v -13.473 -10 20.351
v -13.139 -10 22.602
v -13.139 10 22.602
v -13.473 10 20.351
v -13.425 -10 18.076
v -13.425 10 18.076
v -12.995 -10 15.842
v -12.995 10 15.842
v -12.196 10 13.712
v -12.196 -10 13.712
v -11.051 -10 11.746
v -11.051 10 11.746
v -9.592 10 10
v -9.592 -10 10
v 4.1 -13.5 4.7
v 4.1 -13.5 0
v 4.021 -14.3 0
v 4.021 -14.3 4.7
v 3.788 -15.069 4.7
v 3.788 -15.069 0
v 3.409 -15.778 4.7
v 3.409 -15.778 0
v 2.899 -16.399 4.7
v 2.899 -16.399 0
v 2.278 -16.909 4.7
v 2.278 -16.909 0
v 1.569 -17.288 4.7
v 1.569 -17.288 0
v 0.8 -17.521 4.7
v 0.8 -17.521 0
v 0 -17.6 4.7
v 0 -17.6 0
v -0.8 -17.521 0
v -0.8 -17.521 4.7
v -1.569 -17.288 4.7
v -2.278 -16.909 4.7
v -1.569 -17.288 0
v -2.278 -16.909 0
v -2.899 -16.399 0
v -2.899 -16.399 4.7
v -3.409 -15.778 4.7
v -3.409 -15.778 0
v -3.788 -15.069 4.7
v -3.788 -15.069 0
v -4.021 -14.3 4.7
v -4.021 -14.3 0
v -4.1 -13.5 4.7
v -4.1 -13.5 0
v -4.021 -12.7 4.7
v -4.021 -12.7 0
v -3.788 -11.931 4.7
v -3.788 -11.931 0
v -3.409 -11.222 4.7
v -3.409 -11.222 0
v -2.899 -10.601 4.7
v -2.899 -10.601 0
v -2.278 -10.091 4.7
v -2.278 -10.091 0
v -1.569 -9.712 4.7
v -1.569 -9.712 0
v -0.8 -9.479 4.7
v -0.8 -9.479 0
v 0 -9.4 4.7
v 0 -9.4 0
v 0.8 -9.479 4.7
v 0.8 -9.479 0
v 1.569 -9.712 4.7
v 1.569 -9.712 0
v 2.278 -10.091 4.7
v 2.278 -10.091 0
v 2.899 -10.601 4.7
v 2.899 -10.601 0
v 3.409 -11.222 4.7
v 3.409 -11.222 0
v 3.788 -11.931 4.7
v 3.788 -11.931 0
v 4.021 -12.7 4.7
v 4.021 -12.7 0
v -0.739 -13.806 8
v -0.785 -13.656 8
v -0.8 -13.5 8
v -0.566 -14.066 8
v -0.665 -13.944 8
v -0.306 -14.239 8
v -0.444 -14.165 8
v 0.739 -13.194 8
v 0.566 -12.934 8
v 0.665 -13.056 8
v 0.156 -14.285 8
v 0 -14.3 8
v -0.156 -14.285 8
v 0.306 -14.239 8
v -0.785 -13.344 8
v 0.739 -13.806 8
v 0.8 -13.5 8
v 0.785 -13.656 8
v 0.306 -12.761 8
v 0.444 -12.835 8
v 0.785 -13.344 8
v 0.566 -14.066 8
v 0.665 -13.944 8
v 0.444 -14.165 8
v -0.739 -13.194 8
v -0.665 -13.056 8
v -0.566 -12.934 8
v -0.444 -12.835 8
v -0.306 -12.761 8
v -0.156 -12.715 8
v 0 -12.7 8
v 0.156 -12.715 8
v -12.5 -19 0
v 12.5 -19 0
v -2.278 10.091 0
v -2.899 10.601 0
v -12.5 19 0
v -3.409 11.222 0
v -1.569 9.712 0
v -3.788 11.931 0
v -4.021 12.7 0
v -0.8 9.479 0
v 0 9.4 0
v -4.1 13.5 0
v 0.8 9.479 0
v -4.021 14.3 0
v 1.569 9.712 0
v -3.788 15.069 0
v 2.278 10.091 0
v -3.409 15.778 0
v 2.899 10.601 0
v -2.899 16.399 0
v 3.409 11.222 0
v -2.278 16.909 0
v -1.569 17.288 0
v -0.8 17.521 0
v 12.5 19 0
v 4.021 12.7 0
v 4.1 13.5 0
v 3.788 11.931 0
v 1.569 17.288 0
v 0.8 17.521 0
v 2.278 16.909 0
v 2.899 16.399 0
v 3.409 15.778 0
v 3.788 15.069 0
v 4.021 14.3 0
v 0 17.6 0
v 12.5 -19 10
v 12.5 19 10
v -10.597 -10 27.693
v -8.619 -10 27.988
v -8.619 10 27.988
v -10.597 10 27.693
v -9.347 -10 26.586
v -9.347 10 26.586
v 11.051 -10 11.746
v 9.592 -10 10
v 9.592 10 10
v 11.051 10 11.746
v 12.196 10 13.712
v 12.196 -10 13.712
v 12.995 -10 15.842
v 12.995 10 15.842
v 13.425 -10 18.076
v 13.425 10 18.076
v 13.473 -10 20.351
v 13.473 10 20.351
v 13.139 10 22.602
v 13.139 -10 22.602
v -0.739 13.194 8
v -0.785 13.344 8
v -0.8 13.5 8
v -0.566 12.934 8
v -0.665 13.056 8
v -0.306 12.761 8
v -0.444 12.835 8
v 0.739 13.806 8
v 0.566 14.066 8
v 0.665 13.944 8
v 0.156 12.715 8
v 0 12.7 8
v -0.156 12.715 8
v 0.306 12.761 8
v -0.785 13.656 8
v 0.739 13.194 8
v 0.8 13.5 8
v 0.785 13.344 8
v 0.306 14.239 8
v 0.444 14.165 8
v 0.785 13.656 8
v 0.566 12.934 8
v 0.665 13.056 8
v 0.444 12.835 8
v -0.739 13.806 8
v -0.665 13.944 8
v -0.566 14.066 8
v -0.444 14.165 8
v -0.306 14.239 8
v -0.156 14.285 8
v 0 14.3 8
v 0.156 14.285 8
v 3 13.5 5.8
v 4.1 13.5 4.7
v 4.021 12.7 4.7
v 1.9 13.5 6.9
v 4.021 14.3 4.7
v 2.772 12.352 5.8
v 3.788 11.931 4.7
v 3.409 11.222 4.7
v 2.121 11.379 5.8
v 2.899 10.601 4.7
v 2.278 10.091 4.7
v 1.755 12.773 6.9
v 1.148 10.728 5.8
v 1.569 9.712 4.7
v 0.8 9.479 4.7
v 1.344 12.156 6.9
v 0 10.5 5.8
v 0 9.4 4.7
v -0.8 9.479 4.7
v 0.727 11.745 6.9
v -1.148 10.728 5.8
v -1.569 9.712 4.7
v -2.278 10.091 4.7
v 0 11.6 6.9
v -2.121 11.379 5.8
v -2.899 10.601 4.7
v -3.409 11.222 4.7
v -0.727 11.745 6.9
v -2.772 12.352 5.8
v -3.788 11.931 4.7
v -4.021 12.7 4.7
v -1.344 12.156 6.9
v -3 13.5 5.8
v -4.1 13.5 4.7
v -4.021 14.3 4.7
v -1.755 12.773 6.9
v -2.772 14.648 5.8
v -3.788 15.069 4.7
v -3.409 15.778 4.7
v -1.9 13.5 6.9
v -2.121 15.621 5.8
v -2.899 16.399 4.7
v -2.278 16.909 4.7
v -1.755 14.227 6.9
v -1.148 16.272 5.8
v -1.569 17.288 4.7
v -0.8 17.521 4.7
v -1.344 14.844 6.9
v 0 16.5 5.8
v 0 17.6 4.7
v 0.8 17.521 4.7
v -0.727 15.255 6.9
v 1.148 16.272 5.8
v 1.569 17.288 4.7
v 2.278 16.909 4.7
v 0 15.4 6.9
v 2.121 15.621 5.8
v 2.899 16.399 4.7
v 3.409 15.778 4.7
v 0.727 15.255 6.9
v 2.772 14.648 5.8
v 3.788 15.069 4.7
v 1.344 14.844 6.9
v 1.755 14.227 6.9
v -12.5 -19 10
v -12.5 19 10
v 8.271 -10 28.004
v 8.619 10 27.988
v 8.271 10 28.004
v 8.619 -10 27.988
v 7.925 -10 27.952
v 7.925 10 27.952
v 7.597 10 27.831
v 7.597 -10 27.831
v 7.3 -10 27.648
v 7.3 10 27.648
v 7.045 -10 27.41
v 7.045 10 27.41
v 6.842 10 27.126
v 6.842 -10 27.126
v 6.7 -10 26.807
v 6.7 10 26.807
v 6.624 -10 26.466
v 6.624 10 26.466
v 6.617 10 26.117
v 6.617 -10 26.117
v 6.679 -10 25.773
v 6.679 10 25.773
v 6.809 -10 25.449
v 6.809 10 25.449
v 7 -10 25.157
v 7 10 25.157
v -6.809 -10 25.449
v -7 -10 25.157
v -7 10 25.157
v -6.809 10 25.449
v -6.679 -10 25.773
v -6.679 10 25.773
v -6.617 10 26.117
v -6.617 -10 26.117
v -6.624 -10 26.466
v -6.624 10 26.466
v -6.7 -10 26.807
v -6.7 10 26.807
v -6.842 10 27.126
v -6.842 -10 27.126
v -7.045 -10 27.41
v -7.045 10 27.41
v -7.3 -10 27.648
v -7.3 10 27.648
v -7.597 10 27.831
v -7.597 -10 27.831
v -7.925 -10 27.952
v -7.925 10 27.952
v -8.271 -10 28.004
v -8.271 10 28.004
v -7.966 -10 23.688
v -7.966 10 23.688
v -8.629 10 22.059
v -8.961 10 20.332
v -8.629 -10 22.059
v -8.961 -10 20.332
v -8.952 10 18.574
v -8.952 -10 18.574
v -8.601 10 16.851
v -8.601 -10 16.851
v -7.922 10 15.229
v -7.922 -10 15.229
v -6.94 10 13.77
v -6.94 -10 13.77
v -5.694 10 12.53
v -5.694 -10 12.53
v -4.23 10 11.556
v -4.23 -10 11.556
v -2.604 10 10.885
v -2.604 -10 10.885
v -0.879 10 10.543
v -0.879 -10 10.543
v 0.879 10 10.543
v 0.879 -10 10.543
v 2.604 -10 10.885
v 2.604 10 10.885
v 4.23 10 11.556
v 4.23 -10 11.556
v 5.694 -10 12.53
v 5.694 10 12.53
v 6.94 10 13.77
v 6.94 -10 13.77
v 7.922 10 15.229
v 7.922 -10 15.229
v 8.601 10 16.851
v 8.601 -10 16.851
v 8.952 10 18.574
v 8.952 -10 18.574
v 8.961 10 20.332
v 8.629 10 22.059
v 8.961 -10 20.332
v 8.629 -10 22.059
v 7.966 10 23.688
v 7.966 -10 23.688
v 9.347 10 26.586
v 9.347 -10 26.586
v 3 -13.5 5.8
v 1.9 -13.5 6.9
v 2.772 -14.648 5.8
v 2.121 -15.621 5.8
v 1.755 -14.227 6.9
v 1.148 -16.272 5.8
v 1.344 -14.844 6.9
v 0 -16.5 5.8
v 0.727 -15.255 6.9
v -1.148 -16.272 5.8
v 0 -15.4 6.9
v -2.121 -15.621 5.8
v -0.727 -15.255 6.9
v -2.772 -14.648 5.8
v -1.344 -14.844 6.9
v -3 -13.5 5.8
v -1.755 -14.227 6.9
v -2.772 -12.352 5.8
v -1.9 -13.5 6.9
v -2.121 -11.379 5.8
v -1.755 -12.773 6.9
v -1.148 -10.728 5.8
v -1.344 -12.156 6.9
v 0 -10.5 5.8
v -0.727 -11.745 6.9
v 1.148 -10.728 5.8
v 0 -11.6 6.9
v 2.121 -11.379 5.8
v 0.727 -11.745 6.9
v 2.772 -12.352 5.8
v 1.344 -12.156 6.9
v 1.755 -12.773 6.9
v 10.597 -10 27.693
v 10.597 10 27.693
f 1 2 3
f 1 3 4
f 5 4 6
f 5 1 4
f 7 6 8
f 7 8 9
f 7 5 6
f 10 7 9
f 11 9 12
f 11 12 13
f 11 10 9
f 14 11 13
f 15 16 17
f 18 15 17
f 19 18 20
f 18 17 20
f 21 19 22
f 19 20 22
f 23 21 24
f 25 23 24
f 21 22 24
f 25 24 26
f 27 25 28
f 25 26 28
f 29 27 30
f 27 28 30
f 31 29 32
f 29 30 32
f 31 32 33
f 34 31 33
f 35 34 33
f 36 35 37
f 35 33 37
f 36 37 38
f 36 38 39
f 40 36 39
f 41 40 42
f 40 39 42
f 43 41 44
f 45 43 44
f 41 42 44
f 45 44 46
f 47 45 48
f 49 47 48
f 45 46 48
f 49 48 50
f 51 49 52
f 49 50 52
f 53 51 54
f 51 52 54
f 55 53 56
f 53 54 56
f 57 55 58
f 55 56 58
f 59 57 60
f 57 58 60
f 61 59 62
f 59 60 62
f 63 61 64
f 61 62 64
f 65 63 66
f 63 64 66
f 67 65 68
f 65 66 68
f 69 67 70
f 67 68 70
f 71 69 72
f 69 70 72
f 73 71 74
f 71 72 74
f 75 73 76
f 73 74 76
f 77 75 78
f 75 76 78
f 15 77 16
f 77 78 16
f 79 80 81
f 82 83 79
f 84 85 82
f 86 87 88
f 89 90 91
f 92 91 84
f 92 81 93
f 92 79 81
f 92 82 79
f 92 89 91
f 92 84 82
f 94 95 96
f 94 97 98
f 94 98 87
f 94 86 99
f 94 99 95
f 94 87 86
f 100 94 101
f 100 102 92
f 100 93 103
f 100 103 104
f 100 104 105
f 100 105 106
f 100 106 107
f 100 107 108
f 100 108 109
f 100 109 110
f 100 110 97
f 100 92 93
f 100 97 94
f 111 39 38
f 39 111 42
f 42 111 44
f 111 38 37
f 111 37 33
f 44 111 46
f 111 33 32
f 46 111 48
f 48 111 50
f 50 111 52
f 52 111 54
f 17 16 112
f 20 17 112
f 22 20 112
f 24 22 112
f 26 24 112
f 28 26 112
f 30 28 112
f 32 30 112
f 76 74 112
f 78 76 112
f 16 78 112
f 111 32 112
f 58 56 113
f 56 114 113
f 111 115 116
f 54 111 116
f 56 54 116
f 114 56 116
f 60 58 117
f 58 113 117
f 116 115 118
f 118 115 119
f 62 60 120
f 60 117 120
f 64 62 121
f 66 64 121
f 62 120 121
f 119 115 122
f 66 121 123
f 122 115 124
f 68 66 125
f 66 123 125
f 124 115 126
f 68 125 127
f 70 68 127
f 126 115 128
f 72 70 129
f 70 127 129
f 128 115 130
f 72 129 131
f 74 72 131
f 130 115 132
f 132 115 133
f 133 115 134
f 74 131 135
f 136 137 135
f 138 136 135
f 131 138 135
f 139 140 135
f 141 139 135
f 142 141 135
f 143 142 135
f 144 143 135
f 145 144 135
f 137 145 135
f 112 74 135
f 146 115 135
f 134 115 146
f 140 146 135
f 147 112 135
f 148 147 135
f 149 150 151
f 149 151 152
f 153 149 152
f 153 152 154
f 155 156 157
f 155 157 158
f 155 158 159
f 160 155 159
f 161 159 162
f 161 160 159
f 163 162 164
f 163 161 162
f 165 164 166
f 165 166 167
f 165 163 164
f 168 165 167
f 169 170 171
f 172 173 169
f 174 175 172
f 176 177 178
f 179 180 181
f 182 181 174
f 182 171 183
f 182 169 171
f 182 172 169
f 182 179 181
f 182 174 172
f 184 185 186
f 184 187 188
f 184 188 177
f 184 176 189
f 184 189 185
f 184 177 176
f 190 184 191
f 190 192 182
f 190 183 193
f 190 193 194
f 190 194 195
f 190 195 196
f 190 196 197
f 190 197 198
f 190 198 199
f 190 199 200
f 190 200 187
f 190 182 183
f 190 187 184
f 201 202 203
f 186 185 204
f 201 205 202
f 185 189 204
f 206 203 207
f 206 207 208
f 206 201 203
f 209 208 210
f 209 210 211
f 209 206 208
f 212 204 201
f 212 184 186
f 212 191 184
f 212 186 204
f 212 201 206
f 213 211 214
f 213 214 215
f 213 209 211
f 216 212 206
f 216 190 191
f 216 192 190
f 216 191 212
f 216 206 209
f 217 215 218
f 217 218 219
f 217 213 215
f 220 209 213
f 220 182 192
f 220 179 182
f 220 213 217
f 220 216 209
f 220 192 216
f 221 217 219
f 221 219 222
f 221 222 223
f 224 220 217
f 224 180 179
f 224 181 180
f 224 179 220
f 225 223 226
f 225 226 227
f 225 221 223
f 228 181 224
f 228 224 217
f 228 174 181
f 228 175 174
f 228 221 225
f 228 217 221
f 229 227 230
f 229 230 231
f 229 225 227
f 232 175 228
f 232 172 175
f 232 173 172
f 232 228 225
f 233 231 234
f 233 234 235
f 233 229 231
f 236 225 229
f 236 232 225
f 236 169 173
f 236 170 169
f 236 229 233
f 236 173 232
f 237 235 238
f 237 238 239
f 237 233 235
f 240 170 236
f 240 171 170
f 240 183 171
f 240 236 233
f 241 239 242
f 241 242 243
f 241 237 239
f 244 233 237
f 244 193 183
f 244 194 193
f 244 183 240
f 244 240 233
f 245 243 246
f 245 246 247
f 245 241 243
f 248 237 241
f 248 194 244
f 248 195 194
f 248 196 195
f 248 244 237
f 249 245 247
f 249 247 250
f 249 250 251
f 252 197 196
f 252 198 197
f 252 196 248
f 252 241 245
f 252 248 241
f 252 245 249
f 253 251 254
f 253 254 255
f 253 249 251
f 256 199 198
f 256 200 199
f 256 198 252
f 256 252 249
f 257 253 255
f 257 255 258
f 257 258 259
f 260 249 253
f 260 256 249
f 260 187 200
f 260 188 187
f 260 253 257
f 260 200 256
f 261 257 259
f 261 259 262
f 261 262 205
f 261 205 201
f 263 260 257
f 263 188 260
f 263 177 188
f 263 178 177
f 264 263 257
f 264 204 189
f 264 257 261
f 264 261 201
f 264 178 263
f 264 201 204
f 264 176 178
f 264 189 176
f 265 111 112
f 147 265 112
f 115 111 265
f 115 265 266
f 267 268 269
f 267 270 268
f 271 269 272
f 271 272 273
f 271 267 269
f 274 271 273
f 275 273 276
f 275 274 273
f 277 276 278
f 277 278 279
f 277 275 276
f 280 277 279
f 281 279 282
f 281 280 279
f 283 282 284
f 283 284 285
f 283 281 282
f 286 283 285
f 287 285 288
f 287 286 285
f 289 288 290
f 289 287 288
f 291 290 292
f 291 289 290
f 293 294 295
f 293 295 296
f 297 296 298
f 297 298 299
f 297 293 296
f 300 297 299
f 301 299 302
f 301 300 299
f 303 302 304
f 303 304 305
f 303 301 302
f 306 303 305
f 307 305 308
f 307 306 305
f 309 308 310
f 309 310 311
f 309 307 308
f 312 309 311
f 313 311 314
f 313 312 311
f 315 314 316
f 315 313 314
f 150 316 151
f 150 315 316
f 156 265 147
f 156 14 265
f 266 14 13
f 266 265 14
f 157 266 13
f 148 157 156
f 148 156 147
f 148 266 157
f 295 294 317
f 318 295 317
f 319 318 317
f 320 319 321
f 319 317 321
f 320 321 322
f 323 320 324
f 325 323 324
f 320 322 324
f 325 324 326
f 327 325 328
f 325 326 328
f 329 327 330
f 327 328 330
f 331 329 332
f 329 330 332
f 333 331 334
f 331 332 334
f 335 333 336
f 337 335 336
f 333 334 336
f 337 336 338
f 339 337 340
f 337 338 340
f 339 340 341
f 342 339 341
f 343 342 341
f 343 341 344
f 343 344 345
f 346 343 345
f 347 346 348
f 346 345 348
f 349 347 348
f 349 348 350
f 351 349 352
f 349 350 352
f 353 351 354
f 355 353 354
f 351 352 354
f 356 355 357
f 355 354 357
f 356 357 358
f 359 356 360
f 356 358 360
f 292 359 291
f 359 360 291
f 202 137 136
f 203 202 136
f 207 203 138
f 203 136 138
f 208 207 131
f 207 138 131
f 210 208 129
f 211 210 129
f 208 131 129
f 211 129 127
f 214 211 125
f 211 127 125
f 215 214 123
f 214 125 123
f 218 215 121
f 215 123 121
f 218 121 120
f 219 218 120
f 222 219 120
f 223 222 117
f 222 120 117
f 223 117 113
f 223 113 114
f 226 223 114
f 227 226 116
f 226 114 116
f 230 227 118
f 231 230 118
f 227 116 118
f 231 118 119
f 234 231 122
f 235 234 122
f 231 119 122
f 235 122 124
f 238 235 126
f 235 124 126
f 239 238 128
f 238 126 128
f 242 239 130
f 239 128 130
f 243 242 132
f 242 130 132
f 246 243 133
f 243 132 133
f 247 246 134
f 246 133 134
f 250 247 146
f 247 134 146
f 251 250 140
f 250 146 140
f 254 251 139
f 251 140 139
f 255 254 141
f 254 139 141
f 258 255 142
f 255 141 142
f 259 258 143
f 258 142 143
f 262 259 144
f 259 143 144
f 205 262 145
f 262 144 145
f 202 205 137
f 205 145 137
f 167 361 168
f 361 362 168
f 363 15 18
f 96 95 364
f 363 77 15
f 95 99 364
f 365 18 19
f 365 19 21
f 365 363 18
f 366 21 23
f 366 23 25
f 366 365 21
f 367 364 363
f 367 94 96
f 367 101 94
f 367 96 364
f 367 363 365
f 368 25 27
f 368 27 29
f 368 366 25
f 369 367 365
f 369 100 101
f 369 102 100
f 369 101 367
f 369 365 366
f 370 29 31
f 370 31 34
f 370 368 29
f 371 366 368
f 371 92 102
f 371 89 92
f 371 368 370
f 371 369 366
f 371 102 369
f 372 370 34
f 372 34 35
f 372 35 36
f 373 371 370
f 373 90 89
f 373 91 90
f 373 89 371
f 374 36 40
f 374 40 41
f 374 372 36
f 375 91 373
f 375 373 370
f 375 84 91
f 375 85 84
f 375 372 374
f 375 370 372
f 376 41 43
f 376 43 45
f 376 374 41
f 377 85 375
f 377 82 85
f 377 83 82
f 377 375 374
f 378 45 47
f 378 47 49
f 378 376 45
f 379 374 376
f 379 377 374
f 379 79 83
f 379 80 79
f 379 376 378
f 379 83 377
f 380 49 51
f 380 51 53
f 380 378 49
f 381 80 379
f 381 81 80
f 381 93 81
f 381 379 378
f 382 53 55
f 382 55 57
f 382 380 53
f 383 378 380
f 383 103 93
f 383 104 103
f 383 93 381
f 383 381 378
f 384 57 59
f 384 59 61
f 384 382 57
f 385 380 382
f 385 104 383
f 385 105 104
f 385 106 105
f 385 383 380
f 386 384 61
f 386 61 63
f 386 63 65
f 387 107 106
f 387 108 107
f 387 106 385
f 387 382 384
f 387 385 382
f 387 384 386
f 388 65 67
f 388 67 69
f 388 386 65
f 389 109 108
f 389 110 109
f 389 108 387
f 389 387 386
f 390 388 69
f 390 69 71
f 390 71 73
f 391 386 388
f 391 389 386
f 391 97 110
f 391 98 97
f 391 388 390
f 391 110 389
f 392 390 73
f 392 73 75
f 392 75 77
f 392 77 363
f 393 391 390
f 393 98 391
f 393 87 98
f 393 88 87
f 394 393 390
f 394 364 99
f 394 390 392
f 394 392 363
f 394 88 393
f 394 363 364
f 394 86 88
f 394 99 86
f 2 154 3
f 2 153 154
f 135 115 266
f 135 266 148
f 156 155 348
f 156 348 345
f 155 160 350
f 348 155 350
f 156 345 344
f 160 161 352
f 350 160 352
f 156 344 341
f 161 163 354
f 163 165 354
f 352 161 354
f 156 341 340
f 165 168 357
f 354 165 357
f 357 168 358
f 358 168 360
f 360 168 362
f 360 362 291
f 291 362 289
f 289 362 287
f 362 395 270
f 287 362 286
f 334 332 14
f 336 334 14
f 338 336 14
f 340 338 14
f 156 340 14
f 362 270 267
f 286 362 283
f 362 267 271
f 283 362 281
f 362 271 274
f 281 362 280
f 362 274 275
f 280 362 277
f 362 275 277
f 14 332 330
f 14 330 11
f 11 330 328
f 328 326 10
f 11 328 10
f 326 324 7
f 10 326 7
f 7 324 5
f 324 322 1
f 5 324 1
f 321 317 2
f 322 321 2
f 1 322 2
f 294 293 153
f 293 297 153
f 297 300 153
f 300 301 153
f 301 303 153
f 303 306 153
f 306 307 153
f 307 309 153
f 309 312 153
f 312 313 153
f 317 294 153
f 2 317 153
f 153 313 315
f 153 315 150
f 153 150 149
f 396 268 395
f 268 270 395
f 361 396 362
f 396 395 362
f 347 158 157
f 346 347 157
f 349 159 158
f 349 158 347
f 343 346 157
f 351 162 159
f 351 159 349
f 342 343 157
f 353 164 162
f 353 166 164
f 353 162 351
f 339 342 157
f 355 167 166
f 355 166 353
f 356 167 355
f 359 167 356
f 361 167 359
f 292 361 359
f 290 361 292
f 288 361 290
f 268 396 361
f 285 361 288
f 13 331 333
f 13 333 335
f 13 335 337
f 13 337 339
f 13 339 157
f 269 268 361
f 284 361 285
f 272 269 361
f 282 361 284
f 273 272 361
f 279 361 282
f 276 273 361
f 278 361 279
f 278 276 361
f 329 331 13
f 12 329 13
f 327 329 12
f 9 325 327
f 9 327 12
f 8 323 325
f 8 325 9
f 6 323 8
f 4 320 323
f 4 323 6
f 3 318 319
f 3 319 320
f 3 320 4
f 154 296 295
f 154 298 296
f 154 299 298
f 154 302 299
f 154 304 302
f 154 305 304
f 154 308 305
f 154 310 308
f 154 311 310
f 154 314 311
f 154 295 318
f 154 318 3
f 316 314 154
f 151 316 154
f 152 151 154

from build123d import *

# Parameters (mm, degrees)
SKETCH_W     = 25
SKETCH_H     = 38
PAD_DEPTH    = 10
SKETCH001_R  = 4.1
POCKET_DEPTH = 8
CHAMFER_SIZE = 3.3
PAD001_DEPTH = 10


with BuildPart() as part:
    # Sketch → Pad (new body)
    with BuildSketch(Plane.XY):
        Rectangle(SKETCH_W, SKETCH_H)
    extrude(amount=PAD_DEPTH)

    # Sketch001 (on Face5 of Pad) → Pocket (cut)
    with BuildSketch(Plane(origin=(0, 0, 0), x_dir=(1, 0, 0), z_dir=(0, 0, -1))):
        with Locations((0, 13.5)):
            Circle(SKETCH001_R)
        with Locations((0, -13.5)):
            Circle(SKETCH001_R)
    extrude(amount=-POCKET_DEPTH, mode=Mode.SUBTRACT)

    # Chamfer
    chamfer_edges = [part.edges().sort_by_distance(p)[0] for p in [
        (-4.1, 13.5, 8),
        (-4.1, -13.5, 8),
    ]]
    chamfer(chamfer_edges, length=CHAMFER_SIZE)

    # Sketch003 → Pad001 (join, symmetric)
    with BuildSketch(Plane.XZ):
        with BuildLine():
            ThreePointArc((-7, 25.156854), (0, 10.5), (7, 25.156854))
            ThreePointArc((8.619316, 27.987645), (6.842084, 27.125738), (7, 25.156854))
            Line((8.619316, 27.987645), (10.597427, 27.692553))
            Line((10.597427, 27.692553), (9.347427, 26.586053))
            Line((9.347427, 26.586053), (13.138853, 22.601698))
            ThreePointArc((6, 7.406613), (12.218698, 13.759493), (13.138853, 22.601698))
            Line((-6, 7.406613), (6, 7.406613))
            ThreePointArc((-13.138853, 22.601698), (-12.218698, 13.759493), (-6, 7.406613))
            Line((-9.347427, 26.586053), (-13.138853, 22.601698))
            Line((-10.597427, 27.692553), (-9.347427, 26.586053))
            Line((-8.619316, 27.987645), (-10.597427, 27.692553))
            ThreePointArc((-7, 25.156854), (-6.842084, 27.125738), (-8.619316, 27.987645))
        make_face()
    extrude(amount=PAD001_DEPTH, both=True)


solid = part.part
